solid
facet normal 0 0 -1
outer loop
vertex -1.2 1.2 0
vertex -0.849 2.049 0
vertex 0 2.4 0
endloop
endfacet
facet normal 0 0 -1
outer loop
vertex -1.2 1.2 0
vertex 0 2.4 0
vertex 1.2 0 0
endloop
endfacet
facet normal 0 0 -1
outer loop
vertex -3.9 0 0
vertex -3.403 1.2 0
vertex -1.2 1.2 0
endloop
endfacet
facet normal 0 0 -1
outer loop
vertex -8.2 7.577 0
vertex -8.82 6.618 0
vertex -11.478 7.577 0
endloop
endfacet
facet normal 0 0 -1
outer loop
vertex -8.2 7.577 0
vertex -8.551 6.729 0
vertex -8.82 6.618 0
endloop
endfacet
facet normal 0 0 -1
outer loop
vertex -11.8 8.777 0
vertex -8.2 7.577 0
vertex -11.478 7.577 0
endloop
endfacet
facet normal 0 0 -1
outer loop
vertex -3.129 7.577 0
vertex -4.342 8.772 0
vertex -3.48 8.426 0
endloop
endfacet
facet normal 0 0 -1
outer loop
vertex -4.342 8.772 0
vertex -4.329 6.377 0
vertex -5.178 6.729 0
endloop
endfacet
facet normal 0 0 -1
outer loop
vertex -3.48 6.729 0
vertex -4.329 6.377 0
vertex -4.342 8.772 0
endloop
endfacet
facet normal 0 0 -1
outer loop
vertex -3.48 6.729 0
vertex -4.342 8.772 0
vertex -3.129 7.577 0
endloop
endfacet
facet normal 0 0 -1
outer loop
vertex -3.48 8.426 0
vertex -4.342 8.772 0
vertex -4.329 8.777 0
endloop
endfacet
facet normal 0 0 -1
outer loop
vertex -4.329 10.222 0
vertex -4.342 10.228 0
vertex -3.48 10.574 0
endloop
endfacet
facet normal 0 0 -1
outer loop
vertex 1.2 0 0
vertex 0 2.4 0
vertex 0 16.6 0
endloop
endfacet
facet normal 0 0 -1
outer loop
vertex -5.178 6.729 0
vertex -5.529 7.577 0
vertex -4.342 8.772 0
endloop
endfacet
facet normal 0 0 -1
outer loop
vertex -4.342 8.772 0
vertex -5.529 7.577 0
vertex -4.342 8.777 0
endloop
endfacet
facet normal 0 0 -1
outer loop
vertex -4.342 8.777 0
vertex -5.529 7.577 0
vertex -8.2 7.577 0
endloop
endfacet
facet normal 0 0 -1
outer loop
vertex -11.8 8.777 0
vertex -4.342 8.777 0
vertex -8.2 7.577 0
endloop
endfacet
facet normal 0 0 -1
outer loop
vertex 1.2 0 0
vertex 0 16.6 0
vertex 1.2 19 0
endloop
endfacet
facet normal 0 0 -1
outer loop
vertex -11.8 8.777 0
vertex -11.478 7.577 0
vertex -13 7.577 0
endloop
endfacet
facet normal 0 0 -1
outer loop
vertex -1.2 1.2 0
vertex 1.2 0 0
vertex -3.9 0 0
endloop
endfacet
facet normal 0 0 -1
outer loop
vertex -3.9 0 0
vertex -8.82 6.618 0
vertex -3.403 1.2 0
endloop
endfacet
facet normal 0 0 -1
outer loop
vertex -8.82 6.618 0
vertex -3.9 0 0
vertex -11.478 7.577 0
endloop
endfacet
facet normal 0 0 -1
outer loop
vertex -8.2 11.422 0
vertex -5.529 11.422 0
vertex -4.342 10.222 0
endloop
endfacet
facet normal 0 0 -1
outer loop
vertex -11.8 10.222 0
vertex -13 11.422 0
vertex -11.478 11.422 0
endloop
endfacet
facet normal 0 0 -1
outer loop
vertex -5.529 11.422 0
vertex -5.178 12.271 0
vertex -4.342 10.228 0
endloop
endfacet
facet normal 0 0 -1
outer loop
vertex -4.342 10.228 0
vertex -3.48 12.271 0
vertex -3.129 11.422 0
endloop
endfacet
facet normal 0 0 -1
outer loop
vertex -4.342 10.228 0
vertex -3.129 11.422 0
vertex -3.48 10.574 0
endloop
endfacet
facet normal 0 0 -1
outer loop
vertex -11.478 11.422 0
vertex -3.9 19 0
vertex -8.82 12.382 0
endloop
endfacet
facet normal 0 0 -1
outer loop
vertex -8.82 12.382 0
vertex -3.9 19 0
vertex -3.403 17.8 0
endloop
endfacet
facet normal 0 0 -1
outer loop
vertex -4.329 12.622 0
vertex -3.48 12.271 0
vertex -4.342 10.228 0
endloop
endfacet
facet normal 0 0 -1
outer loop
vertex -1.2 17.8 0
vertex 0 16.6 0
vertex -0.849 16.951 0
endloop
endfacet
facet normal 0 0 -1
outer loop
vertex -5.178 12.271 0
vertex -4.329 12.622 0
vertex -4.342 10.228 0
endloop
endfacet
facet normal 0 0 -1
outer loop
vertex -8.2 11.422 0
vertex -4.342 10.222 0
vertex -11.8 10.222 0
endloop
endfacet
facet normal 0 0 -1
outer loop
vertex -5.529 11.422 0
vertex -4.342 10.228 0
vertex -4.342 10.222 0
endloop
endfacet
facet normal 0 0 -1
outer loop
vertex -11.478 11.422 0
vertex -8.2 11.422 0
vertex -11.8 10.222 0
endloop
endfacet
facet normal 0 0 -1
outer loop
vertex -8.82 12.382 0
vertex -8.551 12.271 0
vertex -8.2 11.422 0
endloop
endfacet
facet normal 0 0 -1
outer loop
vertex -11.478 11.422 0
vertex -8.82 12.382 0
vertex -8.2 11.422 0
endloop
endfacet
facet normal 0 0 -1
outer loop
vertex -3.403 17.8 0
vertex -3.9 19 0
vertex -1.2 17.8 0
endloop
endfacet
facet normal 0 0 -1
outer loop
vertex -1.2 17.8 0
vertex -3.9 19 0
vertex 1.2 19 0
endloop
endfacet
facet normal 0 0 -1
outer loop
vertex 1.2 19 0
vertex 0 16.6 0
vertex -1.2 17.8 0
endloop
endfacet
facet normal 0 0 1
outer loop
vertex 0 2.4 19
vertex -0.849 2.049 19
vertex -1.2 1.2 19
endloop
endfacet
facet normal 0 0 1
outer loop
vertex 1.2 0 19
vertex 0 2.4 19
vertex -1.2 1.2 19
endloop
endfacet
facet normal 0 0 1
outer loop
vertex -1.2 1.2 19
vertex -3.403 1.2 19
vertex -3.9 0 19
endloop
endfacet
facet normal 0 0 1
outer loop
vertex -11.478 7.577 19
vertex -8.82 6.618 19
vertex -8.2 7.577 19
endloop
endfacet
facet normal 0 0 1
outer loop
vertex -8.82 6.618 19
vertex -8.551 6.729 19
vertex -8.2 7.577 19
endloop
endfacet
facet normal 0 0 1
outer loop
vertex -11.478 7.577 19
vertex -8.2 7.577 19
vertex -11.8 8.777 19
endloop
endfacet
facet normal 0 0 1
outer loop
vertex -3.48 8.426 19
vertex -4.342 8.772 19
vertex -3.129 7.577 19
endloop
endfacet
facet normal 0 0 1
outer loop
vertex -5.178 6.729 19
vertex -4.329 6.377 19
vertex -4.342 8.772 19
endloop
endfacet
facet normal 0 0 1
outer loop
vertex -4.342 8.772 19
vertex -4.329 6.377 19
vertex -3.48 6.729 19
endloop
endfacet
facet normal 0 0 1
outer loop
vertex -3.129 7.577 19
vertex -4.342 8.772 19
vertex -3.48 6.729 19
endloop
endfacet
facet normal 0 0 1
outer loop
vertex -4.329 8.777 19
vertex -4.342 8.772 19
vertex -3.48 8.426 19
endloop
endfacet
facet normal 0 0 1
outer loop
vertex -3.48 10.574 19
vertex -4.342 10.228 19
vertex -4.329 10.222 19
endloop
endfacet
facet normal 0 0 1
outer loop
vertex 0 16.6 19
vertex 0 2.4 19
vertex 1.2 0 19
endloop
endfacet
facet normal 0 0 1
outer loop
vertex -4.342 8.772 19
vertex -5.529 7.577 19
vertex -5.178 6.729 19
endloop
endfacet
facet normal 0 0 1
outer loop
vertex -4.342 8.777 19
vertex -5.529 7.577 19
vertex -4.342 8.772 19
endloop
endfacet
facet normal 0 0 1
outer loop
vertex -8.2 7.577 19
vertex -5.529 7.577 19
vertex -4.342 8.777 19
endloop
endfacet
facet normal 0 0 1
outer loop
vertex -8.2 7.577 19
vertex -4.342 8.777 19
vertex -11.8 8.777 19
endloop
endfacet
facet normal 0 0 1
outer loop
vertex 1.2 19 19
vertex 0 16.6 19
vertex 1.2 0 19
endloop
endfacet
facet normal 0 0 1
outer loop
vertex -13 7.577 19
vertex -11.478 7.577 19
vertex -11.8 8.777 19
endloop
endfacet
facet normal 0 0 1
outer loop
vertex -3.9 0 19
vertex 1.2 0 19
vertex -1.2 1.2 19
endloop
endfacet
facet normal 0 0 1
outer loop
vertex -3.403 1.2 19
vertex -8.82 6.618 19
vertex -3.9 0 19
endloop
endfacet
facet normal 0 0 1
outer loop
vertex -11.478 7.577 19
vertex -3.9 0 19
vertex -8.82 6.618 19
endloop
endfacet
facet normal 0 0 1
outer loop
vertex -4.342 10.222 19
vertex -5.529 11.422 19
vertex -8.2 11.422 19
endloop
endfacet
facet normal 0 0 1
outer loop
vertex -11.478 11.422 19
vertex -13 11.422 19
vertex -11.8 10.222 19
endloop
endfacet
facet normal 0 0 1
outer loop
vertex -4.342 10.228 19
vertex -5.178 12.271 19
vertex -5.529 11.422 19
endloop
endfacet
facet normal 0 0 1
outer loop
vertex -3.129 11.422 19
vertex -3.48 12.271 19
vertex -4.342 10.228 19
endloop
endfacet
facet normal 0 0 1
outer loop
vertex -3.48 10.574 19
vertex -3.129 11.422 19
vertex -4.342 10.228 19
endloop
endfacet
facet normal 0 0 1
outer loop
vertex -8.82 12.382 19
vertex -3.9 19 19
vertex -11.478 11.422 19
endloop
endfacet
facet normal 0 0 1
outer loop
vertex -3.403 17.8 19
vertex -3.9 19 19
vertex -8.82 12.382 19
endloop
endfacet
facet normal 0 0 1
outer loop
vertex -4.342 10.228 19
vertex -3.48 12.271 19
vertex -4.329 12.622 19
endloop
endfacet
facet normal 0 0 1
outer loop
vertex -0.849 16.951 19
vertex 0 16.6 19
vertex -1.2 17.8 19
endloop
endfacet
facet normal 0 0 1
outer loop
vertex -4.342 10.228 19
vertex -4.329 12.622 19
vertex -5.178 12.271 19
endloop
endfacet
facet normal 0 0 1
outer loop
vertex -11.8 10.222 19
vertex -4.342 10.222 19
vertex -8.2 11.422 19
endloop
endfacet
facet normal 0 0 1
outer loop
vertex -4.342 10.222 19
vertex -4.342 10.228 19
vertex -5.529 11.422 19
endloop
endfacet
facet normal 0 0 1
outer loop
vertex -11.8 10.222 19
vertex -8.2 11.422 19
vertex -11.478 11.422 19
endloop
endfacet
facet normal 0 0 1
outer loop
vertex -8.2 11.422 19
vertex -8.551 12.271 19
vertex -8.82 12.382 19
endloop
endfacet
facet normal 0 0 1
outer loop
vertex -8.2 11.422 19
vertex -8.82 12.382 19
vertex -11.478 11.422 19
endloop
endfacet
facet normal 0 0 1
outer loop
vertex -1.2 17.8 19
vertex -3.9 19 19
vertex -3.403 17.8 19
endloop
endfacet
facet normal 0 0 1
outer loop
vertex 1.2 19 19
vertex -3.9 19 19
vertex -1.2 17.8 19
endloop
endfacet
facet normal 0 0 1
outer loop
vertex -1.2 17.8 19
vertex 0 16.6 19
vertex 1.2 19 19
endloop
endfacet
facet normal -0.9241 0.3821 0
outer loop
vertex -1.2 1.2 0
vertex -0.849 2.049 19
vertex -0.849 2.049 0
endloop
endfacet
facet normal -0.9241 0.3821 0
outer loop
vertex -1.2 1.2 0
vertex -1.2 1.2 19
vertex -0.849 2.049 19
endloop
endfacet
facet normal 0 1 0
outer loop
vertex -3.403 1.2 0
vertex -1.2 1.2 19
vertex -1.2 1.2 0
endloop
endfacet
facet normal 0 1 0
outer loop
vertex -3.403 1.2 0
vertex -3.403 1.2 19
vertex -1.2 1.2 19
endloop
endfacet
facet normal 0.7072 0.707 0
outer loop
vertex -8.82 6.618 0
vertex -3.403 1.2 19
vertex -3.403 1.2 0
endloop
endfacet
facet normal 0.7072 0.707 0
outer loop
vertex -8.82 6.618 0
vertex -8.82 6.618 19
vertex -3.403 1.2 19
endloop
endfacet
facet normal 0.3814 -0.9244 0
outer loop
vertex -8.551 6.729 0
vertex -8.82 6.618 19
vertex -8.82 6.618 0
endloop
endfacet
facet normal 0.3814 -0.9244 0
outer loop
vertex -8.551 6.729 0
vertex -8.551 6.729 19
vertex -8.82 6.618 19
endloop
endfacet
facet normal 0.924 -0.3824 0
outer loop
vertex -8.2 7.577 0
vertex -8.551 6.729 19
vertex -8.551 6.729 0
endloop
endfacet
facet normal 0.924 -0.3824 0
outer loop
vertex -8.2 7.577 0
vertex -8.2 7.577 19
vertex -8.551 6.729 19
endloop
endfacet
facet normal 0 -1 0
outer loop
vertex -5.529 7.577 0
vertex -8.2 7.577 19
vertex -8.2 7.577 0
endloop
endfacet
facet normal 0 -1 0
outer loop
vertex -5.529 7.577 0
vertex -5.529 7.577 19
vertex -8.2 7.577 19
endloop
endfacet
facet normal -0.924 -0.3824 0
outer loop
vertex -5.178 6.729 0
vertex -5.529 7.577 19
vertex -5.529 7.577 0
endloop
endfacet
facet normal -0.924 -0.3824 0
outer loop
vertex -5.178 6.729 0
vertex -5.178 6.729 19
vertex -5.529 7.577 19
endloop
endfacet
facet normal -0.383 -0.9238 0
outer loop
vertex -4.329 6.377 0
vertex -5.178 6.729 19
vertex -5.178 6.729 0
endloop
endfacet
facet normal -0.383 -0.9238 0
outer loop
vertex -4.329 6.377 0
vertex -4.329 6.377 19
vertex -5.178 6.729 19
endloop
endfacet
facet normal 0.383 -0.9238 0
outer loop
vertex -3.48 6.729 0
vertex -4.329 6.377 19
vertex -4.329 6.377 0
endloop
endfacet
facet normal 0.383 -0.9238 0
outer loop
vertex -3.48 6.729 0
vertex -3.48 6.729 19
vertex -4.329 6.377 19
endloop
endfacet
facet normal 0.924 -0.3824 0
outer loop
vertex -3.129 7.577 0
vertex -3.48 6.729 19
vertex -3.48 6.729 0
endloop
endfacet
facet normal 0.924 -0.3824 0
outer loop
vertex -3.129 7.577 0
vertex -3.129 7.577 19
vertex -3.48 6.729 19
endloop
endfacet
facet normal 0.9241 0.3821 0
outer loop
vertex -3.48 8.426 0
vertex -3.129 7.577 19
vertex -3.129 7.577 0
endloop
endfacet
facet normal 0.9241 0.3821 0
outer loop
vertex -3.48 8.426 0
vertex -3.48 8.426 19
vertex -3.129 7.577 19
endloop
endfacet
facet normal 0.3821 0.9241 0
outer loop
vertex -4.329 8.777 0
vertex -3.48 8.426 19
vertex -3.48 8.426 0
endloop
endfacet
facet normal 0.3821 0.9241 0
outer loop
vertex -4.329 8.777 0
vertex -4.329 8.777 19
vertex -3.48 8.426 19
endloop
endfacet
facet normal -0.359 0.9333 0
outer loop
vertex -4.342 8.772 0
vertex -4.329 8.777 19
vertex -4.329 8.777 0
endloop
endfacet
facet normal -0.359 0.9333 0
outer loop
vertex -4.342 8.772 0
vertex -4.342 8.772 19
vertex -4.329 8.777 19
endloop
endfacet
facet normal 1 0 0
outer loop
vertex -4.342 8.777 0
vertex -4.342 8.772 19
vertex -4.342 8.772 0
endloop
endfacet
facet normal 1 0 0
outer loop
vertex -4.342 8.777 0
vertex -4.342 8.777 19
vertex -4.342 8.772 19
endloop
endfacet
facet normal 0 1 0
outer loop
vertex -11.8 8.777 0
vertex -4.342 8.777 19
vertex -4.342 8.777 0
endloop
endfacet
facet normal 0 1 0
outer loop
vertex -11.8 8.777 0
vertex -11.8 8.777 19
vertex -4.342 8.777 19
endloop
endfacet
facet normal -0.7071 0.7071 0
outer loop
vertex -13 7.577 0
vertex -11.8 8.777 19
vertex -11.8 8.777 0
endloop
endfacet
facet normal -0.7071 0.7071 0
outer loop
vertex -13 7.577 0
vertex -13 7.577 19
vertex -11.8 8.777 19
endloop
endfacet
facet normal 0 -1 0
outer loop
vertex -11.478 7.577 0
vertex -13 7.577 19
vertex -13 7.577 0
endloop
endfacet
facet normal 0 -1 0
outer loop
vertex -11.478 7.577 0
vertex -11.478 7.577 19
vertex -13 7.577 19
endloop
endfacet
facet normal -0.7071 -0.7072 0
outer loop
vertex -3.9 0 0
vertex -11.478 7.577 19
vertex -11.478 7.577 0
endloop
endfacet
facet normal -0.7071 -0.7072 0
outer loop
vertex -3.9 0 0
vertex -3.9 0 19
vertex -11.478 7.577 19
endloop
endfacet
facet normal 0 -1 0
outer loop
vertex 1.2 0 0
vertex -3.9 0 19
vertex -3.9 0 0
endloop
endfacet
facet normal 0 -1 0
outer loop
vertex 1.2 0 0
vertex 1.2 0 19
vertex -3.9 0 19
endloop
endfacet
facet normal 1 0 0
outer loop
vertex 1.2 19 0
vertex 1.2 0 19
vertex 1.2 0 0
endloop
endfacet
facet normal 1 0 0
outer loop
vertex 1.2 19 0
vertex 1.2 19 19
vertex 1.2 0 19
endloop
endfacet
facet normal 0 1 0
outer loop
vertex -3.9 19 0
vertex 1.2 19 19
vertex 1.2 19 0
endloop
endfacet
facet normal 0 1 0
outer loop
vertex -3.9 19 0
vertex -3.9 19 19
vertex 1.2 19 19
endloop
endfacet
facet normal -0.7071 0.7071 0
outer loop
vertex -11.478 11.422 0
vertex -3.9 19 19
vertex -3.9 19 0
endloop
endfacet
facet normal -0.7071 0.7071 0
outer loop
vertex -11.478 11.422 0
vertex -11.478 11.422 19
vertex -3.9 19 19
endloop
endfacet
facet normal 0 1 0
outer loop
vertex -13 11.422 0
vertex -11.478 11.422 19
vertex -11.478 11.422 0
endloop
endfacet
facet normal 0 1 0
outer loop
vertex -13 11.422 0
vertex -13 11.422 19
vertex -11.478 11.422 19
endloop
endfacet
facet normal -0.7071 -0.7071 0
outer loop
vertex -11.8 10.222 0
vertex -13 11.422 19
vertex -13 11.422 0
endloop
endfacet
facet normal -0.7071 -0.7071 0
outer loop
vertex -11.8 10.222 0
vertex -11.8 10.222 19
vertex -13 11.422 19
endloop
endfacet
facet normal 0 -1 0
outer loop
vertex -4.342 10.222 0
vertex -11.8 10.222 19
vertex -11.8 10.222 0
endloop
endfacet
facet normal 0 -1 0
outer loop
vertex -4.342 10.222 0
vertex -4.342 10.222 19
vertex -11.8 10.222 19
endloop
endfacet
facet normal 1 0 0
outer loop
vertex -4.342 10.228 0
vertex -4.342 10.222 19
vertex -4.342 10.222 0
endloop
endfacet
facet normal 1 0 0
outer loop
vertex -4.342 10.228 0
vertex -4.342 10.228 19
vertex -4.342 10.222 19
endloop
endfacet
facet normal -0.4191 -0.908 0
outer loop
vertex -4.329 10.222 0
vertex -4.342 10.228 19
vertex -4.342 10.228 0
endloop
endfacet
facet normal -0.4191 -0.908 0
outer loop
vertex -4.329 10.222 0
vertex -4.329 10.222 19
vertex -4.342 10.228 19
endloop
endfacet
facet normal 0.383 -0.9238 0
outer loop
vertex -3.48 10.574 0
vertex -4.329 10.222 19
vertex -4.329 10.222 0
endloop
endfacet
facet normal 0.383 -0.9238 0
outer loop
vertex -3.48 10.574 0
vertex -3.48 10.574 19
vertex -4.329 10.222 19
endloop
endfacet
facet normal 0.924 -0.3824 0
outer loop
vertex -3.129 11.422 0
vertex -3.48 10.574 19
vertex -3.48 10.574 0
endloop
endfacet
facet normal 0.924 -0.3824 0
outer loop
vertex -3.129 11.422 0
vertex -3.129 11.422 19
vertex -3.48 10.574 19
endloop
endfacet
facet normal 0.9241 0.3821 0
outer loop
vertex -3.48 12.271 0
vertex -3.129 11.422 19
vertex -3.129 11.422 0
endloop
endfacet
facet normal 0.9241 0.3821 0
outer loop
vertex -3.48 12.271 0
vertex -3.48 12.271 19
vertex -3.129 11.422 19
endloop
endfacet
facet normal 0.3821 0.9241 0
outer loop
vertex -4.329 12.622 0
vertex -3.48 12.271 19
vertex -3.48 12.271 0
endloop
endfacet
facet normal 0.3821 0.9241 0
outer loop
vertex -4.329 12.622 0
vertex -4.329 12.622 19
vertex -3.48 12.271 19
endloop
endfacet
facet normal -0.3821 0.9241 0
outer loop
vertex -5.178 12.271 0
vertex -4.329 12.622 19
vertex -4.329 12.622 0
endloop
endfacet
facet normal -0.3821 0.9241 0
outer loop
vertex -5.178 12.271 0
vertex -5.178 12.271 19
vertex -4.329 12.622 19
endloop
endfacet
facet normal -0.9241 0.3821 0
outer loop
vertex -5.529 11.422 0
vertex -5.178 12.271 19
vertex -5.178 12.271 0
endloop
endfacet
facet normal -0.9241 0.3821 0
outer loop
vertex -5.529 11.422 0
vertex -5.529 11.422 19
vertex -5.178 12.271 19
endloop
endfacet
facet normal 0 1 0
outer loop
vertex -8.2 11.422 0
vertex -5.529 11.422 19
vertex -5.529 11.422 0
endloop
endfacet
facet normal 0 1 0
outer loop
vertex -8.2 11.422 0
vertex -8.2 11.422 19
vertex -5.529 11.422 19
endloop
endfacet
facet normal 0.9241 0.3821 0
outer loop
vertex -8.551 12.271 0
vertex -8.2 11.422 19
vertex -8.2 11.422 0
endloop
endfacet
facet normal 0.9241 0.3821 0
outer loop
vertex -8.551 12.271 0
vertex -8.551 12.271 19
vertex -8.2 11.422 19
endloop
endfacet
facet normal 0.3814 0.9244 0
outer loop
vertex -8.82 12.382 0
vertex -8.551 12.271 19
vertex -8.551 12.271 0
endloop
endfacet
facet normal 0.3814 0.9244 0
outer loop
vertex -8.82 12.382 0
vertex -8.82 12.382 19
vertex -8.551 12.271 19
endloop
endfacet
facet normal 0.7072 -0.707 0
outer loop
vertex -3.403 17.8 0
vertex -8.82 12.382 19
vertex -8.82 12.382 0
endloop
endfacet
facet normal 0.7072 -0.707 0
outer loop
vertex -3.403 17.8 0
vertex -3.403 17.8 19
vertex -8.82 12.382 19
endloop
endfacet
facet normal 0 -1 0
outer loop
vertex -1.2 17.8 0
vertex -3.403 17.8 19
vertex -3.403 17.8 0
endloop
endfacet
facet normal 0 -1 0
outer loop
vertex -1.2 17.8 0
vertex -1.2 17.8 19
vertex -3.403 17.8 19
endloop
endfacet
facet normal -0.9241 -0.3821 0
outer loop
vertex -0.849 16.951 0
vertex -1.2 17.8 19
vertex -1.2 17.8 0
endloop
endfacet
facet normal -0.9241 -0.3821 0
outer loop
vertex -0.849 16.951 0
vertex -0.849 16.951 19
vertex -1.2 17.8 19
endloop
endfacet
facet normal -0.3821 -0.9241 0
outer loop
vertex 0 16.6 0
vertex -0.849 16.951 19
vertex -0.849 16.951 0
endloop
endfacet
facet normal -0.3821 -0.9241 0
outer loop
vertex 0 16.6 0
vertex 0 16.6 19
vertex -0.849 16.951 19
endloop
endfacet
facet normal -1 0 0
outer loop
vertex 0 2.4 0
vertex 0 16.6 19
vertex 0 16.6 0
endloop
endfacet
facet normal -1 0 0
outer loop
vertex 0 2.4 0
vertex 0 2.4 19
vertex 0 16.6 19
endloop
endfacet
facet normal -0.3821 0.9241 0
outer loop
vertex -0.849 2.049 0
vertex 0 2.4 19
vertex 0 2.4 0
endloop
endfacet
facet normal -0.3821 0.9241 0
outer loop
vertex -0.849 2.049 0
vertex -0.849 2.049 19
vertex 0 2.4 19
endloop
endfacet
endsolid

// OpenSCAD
base_length = 19;
base_height = 13;
base_width = 19;

insert_thickness = 1.7;

module game_piece_base(
    base_length=0,
    base_height=0,
    base_width=0,
    insert_thickness=0
    ) {
        $fs = 1;
        edge_thickness = 1.2;
        
        linear_extrude(height=base_length) difference() {
            union() {
                square([edge_thickness, base_length]);
                
                rotate([0, 0, 90]) square([edge_thickness, base_height * .3]);
                translate([0, base_length - edge_thickness, 0])
                    rotate([0, 0, 90]) square([edge_thickness, base_height * .3]);
               
                translate([-base_height * .3, 0, 0]) rotate([0, 0, 45]) square([edge_thickness, sqrt( pow(base_height * .7, 2) * 2)]);

                translate([-base_height * .3, base_length, 0]) rotate([0, 0, -45]) translate([0, -sqrt( pow(base_height * .7, 2) * 2), 0]) square([edge_thickness, sqrt( pow(base_height * .7, 2) * 2)]);
                
                translate([-base_height, (base_width - ((insert_thickness * .85) + (2 * edge_thickness)))/ 2, 0]) square([base_height * .666, (insert_thickness * .85) + (2 * edge_thickness)]); 
                
                translate([0, edge_thickness, 0]) circle(r=edge_thickness);
                translate([0, base_width - edge_thickness, 0]) circle(r=edge_thickness);
                translate([-base_height * .333, (base_width / 2)-edge_thickness-(insert_thickness*.85/2), 0]) circle(r=edge_thickness);
                translate([-base_height * .333, (base_width / 2)+edge_thickness+(insert_thickness*.85/2), 0]) circle(r=edge_thickness);

                translate([-base_height + 3 * edge_thickness, (base_width / 2)-edge_thickness-(insert_thickness*.85/2), 0]) circle(r=edge_thickness);
                translate([-base_height + 3 * edge_thickness, (base_width / 2)+edge_thickness+(insert_thickness*.85/2), 0]) circle(r=edge_thickness);
            }
            
            translate([0, (base_width - (insert_thickness * .85)) / 2, 0]) rotate([0, 0, 90]) square([insert_thickness * .85, base_length]);
            
            diamond_cutout_hypotenuse = (edge_thickness * 2) + (insert_thickness * .85);
            diamond_cutout_side_length = sqrt( pow( diamond_cutout_hypotenuse, 2) / 2 );
            
            translate([-base_height, base_width / 2 - (diamond_cutout_hypotenuse/2), 0]) rotate([0, 0, 45]) square([diamond_cutout_side_length, diamond_cutout_side_length]);
        }
}

game_piece_base(
    base_length=base_length,
    base_height=base_height,
    base_width=base_width,
    insert_thickness=insert_thickness
);
